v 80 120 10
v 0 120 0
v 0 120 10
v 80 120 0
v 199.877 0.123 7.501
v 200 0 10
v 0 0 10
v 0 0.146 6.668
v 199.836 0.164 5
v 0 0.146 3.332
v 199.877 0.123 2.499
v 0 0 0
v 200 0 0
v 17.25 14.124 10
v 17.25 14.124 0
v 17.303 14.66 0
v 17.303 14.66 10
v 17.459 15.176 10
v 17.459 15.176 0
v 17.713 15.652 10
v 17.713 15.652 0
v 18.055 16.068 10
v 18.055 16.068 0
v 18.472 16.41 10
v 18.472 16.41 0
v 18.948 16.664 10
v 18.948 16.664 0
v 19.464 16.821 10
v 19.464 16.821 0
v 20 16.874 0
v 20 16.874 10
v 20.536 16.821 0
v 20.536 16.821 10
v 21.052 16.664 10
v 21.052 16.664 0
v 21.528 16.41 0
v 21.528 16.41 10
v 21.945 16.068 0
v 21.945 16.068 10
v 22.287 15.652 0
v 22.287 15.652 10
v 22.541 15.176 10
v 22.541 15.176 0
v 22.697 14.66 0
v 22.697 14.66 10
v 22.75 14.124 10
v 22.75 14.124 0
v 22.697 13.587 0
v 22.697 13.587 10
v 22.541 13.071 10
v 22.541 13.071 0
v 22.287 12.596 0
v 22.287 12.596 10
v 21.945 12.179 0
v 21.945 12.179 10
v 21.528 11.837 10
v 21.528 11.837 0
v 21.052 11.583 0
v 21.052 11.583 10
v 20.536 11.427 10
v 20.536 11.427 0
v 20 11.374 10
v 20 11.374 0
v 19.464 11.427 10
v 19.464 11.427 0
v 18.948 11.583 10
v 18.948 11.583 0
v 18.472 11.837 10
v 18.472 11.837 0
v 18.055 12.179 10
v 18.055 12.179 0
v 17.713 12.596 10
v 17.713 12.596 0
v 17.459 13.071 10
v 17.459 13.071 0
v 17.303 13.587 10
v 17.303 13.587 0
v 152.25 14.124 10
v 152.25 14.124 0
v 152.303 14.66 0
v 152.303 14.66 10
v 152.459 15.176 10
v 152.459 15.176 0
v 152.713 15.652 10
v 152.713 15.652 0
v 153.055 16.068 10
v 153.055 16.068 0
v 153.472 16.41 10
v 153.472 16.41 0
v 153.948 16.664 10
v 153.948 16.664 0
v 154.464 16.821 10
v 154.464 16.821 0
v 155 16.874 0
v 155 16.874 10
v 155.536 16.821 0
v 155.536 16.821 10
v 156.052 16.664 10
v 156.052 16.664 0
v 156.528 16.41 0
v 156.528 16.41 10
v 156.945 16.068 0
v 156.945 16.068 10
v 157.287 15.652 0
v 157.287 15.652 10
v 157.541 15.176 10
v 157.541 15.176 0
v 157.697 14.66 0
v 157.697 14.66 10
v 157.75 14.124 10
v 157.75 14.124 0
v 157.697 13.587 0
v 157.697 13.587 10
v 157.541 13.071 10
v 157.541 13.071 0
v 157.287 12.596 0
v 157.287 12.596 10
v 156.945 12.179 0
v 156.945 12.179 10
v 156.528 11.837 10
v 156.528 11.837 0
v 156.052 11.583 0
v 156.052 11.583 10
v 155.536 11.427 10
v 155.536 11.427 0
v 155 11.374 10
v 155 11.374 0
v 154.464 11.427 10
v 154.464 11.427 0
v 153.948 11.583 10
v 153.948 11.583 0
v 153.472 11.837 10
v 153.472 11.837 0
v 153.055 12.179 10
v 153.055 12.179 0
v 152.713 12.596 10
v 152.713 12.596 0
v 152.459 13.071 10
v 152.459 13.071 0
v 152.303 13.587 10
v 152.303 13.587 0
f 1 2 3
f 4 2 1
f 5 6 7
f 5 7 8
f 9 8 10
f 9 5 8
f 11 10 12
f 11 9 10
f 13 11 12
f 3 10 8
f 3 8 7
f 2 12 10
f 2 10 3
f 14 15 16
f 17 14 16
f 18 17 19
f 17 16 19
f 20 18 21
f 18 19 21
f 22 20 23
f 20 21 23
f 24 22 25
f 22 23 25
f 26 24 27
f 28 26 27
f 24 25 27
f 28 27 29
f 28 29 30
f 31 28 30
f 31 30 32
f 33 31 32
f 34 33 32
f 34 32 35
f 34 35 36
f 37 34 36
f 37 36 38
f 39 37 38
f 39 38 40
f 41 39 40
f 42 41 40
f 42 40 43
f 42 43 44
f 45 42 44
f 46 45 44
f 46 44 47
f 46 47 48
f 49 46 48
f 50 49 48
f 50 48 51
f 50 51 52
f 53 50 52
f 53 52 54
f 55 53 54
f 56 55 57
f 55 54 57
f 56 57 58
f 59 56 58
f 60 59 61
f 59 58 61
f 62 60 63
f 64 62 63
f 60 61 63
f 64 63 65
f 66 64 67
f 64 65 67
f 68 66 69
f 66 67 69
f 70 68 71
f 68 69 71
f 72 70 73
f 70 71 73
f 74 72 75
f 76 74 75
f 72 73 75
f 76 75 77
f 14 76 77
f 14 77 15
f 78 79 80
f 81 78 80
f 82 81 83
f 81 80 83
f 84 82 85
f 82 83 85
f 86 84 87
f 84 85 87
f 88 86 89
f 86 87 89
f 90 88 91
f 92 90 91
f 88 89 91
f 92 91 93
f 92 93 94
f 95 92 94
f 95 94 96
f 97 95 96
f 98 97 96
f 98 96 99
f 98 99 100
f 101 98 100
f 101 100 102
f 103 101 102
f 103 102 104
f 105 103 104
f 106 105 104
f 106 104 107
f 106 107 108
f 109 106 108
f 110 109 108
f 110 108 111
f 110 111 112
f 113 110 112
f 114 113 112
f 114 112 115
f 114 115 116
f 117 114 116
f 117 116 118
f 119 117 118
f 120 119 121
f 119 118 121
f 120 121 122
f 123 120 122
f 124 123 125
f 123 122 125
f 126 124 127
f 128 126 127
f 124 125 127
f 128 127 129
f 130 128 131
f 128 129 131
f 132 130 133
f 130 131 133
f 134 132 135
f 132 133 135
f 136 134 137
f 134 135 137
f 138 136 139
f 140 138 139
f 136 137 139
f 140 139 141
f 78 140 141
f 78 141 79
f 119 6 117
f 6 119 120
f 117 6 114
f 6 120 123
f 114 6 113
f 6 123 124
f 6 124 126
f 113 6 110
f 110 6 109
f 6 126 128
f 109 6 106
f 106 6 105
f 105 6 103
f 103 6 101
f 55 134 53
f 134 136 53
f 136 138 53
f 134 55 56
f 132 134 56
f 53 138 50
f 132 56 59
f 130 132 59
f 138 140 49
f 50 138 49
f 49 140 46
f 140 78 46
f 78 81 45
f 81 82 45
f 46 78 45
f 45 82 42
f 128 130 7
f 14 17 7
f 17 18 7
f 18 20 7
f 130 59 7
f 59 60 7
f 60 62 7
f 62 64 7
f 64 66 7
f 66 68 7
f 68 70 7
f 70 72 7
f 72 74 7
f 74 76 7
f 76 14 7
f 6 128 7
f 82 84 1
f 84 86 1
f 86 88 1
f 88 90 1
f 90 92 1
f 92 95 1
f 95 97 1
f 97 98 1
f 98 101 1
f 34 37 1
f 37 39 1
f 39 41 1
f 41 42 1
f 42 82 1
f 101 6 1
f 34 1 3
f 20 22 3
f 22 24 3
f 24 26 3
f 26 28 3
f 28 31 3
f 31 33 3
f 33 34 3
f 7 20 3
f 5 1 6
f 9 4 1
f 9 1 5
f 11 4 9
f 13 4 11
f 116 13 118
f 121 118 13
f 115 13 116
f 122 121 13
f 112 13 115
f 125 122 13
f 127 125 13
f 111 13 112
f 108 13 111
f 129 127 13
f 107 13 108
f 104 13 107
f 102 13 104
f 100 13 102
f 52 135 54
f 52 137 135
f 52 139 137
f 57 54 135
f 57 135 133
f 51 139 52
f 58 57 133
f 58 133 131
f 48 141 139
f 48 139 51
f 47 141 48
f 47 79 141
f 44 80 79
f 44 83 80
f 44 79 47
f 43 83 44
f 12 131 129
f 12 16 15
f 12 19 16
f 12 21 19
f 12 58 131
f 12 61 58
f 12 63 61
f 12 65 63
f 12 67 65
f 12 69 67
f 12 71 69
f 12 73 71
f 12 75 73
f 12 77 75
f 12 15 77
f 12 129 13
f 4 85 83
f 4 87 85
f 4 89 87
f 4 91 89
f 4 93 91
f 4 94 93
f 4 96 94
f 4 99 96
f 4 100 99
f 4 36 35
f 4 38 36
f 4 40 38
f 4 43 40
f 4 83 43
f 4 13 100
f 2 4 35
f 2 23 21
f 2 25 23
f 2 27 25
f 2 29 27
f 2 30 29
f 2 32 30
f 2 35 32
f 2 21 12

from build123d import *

# Parameters (mm, degrees)
BOSS_EXTRU_1_DEPTH           = 10
ENL_V_MAT_EXTRU_1_DEPTH      = 234.452350599
ENL_V_MAT_EXTRU_1_DEPTH_BACK = 234.452350599
D_GAGEMENT_M51_D             = 5.5


with BuildPart() as part:
    # Esquisse1 → Boss.-Extru.1 (new body)
    with BuildSketch(Plane.XY):
        Polygon((0, 0), (0, 120), (80, 120), (200, 0), align=None)
    extrude(amount=BOSS_EXTRU_1_DEPTH)

    # Esquisse2 → Enlèv. mat.-Extru.1 (cut, two sides: drawn at the far end of the back side and taken through both)
    with BuildSketch(Plane.ZY.offset(-ENL_V_MAT_EXTRU_1_DEPTH_BACK)):
        with BuildLine():
            Line((260.291322683, -16.458785536), (10, 0))
            ThreePointArc((10, 0), (5, 0.164218949), (0, 0))
            Line((0, 0), (-250.291322683, -16.458785536))
            Line((-250.291322683, -16.458785536), (-250.291322683, -518.122568688))
            Line((-250.291322683, -518.122568688), (260.291322683, -518.122568688))
            Line((260.291322683, -518.122568688), (260.291322683, -16.458785536))
        make_face()
    extrude(amount=ENL_V_MAT_EXTRU_1_DEPTH + ENL_V_MAT_EXTRU_1_DEPTH_BACK, mode=Mode.SUBTRACT)

    # Dégagement M51 (through all)
    with Locations(Plane.XY.offset(10)):
        with Locations((155, 14.123808081), (20, 14.123808081)):
            Hole(D_GAGEMENT_M51_D / 2)


solid = part.part
